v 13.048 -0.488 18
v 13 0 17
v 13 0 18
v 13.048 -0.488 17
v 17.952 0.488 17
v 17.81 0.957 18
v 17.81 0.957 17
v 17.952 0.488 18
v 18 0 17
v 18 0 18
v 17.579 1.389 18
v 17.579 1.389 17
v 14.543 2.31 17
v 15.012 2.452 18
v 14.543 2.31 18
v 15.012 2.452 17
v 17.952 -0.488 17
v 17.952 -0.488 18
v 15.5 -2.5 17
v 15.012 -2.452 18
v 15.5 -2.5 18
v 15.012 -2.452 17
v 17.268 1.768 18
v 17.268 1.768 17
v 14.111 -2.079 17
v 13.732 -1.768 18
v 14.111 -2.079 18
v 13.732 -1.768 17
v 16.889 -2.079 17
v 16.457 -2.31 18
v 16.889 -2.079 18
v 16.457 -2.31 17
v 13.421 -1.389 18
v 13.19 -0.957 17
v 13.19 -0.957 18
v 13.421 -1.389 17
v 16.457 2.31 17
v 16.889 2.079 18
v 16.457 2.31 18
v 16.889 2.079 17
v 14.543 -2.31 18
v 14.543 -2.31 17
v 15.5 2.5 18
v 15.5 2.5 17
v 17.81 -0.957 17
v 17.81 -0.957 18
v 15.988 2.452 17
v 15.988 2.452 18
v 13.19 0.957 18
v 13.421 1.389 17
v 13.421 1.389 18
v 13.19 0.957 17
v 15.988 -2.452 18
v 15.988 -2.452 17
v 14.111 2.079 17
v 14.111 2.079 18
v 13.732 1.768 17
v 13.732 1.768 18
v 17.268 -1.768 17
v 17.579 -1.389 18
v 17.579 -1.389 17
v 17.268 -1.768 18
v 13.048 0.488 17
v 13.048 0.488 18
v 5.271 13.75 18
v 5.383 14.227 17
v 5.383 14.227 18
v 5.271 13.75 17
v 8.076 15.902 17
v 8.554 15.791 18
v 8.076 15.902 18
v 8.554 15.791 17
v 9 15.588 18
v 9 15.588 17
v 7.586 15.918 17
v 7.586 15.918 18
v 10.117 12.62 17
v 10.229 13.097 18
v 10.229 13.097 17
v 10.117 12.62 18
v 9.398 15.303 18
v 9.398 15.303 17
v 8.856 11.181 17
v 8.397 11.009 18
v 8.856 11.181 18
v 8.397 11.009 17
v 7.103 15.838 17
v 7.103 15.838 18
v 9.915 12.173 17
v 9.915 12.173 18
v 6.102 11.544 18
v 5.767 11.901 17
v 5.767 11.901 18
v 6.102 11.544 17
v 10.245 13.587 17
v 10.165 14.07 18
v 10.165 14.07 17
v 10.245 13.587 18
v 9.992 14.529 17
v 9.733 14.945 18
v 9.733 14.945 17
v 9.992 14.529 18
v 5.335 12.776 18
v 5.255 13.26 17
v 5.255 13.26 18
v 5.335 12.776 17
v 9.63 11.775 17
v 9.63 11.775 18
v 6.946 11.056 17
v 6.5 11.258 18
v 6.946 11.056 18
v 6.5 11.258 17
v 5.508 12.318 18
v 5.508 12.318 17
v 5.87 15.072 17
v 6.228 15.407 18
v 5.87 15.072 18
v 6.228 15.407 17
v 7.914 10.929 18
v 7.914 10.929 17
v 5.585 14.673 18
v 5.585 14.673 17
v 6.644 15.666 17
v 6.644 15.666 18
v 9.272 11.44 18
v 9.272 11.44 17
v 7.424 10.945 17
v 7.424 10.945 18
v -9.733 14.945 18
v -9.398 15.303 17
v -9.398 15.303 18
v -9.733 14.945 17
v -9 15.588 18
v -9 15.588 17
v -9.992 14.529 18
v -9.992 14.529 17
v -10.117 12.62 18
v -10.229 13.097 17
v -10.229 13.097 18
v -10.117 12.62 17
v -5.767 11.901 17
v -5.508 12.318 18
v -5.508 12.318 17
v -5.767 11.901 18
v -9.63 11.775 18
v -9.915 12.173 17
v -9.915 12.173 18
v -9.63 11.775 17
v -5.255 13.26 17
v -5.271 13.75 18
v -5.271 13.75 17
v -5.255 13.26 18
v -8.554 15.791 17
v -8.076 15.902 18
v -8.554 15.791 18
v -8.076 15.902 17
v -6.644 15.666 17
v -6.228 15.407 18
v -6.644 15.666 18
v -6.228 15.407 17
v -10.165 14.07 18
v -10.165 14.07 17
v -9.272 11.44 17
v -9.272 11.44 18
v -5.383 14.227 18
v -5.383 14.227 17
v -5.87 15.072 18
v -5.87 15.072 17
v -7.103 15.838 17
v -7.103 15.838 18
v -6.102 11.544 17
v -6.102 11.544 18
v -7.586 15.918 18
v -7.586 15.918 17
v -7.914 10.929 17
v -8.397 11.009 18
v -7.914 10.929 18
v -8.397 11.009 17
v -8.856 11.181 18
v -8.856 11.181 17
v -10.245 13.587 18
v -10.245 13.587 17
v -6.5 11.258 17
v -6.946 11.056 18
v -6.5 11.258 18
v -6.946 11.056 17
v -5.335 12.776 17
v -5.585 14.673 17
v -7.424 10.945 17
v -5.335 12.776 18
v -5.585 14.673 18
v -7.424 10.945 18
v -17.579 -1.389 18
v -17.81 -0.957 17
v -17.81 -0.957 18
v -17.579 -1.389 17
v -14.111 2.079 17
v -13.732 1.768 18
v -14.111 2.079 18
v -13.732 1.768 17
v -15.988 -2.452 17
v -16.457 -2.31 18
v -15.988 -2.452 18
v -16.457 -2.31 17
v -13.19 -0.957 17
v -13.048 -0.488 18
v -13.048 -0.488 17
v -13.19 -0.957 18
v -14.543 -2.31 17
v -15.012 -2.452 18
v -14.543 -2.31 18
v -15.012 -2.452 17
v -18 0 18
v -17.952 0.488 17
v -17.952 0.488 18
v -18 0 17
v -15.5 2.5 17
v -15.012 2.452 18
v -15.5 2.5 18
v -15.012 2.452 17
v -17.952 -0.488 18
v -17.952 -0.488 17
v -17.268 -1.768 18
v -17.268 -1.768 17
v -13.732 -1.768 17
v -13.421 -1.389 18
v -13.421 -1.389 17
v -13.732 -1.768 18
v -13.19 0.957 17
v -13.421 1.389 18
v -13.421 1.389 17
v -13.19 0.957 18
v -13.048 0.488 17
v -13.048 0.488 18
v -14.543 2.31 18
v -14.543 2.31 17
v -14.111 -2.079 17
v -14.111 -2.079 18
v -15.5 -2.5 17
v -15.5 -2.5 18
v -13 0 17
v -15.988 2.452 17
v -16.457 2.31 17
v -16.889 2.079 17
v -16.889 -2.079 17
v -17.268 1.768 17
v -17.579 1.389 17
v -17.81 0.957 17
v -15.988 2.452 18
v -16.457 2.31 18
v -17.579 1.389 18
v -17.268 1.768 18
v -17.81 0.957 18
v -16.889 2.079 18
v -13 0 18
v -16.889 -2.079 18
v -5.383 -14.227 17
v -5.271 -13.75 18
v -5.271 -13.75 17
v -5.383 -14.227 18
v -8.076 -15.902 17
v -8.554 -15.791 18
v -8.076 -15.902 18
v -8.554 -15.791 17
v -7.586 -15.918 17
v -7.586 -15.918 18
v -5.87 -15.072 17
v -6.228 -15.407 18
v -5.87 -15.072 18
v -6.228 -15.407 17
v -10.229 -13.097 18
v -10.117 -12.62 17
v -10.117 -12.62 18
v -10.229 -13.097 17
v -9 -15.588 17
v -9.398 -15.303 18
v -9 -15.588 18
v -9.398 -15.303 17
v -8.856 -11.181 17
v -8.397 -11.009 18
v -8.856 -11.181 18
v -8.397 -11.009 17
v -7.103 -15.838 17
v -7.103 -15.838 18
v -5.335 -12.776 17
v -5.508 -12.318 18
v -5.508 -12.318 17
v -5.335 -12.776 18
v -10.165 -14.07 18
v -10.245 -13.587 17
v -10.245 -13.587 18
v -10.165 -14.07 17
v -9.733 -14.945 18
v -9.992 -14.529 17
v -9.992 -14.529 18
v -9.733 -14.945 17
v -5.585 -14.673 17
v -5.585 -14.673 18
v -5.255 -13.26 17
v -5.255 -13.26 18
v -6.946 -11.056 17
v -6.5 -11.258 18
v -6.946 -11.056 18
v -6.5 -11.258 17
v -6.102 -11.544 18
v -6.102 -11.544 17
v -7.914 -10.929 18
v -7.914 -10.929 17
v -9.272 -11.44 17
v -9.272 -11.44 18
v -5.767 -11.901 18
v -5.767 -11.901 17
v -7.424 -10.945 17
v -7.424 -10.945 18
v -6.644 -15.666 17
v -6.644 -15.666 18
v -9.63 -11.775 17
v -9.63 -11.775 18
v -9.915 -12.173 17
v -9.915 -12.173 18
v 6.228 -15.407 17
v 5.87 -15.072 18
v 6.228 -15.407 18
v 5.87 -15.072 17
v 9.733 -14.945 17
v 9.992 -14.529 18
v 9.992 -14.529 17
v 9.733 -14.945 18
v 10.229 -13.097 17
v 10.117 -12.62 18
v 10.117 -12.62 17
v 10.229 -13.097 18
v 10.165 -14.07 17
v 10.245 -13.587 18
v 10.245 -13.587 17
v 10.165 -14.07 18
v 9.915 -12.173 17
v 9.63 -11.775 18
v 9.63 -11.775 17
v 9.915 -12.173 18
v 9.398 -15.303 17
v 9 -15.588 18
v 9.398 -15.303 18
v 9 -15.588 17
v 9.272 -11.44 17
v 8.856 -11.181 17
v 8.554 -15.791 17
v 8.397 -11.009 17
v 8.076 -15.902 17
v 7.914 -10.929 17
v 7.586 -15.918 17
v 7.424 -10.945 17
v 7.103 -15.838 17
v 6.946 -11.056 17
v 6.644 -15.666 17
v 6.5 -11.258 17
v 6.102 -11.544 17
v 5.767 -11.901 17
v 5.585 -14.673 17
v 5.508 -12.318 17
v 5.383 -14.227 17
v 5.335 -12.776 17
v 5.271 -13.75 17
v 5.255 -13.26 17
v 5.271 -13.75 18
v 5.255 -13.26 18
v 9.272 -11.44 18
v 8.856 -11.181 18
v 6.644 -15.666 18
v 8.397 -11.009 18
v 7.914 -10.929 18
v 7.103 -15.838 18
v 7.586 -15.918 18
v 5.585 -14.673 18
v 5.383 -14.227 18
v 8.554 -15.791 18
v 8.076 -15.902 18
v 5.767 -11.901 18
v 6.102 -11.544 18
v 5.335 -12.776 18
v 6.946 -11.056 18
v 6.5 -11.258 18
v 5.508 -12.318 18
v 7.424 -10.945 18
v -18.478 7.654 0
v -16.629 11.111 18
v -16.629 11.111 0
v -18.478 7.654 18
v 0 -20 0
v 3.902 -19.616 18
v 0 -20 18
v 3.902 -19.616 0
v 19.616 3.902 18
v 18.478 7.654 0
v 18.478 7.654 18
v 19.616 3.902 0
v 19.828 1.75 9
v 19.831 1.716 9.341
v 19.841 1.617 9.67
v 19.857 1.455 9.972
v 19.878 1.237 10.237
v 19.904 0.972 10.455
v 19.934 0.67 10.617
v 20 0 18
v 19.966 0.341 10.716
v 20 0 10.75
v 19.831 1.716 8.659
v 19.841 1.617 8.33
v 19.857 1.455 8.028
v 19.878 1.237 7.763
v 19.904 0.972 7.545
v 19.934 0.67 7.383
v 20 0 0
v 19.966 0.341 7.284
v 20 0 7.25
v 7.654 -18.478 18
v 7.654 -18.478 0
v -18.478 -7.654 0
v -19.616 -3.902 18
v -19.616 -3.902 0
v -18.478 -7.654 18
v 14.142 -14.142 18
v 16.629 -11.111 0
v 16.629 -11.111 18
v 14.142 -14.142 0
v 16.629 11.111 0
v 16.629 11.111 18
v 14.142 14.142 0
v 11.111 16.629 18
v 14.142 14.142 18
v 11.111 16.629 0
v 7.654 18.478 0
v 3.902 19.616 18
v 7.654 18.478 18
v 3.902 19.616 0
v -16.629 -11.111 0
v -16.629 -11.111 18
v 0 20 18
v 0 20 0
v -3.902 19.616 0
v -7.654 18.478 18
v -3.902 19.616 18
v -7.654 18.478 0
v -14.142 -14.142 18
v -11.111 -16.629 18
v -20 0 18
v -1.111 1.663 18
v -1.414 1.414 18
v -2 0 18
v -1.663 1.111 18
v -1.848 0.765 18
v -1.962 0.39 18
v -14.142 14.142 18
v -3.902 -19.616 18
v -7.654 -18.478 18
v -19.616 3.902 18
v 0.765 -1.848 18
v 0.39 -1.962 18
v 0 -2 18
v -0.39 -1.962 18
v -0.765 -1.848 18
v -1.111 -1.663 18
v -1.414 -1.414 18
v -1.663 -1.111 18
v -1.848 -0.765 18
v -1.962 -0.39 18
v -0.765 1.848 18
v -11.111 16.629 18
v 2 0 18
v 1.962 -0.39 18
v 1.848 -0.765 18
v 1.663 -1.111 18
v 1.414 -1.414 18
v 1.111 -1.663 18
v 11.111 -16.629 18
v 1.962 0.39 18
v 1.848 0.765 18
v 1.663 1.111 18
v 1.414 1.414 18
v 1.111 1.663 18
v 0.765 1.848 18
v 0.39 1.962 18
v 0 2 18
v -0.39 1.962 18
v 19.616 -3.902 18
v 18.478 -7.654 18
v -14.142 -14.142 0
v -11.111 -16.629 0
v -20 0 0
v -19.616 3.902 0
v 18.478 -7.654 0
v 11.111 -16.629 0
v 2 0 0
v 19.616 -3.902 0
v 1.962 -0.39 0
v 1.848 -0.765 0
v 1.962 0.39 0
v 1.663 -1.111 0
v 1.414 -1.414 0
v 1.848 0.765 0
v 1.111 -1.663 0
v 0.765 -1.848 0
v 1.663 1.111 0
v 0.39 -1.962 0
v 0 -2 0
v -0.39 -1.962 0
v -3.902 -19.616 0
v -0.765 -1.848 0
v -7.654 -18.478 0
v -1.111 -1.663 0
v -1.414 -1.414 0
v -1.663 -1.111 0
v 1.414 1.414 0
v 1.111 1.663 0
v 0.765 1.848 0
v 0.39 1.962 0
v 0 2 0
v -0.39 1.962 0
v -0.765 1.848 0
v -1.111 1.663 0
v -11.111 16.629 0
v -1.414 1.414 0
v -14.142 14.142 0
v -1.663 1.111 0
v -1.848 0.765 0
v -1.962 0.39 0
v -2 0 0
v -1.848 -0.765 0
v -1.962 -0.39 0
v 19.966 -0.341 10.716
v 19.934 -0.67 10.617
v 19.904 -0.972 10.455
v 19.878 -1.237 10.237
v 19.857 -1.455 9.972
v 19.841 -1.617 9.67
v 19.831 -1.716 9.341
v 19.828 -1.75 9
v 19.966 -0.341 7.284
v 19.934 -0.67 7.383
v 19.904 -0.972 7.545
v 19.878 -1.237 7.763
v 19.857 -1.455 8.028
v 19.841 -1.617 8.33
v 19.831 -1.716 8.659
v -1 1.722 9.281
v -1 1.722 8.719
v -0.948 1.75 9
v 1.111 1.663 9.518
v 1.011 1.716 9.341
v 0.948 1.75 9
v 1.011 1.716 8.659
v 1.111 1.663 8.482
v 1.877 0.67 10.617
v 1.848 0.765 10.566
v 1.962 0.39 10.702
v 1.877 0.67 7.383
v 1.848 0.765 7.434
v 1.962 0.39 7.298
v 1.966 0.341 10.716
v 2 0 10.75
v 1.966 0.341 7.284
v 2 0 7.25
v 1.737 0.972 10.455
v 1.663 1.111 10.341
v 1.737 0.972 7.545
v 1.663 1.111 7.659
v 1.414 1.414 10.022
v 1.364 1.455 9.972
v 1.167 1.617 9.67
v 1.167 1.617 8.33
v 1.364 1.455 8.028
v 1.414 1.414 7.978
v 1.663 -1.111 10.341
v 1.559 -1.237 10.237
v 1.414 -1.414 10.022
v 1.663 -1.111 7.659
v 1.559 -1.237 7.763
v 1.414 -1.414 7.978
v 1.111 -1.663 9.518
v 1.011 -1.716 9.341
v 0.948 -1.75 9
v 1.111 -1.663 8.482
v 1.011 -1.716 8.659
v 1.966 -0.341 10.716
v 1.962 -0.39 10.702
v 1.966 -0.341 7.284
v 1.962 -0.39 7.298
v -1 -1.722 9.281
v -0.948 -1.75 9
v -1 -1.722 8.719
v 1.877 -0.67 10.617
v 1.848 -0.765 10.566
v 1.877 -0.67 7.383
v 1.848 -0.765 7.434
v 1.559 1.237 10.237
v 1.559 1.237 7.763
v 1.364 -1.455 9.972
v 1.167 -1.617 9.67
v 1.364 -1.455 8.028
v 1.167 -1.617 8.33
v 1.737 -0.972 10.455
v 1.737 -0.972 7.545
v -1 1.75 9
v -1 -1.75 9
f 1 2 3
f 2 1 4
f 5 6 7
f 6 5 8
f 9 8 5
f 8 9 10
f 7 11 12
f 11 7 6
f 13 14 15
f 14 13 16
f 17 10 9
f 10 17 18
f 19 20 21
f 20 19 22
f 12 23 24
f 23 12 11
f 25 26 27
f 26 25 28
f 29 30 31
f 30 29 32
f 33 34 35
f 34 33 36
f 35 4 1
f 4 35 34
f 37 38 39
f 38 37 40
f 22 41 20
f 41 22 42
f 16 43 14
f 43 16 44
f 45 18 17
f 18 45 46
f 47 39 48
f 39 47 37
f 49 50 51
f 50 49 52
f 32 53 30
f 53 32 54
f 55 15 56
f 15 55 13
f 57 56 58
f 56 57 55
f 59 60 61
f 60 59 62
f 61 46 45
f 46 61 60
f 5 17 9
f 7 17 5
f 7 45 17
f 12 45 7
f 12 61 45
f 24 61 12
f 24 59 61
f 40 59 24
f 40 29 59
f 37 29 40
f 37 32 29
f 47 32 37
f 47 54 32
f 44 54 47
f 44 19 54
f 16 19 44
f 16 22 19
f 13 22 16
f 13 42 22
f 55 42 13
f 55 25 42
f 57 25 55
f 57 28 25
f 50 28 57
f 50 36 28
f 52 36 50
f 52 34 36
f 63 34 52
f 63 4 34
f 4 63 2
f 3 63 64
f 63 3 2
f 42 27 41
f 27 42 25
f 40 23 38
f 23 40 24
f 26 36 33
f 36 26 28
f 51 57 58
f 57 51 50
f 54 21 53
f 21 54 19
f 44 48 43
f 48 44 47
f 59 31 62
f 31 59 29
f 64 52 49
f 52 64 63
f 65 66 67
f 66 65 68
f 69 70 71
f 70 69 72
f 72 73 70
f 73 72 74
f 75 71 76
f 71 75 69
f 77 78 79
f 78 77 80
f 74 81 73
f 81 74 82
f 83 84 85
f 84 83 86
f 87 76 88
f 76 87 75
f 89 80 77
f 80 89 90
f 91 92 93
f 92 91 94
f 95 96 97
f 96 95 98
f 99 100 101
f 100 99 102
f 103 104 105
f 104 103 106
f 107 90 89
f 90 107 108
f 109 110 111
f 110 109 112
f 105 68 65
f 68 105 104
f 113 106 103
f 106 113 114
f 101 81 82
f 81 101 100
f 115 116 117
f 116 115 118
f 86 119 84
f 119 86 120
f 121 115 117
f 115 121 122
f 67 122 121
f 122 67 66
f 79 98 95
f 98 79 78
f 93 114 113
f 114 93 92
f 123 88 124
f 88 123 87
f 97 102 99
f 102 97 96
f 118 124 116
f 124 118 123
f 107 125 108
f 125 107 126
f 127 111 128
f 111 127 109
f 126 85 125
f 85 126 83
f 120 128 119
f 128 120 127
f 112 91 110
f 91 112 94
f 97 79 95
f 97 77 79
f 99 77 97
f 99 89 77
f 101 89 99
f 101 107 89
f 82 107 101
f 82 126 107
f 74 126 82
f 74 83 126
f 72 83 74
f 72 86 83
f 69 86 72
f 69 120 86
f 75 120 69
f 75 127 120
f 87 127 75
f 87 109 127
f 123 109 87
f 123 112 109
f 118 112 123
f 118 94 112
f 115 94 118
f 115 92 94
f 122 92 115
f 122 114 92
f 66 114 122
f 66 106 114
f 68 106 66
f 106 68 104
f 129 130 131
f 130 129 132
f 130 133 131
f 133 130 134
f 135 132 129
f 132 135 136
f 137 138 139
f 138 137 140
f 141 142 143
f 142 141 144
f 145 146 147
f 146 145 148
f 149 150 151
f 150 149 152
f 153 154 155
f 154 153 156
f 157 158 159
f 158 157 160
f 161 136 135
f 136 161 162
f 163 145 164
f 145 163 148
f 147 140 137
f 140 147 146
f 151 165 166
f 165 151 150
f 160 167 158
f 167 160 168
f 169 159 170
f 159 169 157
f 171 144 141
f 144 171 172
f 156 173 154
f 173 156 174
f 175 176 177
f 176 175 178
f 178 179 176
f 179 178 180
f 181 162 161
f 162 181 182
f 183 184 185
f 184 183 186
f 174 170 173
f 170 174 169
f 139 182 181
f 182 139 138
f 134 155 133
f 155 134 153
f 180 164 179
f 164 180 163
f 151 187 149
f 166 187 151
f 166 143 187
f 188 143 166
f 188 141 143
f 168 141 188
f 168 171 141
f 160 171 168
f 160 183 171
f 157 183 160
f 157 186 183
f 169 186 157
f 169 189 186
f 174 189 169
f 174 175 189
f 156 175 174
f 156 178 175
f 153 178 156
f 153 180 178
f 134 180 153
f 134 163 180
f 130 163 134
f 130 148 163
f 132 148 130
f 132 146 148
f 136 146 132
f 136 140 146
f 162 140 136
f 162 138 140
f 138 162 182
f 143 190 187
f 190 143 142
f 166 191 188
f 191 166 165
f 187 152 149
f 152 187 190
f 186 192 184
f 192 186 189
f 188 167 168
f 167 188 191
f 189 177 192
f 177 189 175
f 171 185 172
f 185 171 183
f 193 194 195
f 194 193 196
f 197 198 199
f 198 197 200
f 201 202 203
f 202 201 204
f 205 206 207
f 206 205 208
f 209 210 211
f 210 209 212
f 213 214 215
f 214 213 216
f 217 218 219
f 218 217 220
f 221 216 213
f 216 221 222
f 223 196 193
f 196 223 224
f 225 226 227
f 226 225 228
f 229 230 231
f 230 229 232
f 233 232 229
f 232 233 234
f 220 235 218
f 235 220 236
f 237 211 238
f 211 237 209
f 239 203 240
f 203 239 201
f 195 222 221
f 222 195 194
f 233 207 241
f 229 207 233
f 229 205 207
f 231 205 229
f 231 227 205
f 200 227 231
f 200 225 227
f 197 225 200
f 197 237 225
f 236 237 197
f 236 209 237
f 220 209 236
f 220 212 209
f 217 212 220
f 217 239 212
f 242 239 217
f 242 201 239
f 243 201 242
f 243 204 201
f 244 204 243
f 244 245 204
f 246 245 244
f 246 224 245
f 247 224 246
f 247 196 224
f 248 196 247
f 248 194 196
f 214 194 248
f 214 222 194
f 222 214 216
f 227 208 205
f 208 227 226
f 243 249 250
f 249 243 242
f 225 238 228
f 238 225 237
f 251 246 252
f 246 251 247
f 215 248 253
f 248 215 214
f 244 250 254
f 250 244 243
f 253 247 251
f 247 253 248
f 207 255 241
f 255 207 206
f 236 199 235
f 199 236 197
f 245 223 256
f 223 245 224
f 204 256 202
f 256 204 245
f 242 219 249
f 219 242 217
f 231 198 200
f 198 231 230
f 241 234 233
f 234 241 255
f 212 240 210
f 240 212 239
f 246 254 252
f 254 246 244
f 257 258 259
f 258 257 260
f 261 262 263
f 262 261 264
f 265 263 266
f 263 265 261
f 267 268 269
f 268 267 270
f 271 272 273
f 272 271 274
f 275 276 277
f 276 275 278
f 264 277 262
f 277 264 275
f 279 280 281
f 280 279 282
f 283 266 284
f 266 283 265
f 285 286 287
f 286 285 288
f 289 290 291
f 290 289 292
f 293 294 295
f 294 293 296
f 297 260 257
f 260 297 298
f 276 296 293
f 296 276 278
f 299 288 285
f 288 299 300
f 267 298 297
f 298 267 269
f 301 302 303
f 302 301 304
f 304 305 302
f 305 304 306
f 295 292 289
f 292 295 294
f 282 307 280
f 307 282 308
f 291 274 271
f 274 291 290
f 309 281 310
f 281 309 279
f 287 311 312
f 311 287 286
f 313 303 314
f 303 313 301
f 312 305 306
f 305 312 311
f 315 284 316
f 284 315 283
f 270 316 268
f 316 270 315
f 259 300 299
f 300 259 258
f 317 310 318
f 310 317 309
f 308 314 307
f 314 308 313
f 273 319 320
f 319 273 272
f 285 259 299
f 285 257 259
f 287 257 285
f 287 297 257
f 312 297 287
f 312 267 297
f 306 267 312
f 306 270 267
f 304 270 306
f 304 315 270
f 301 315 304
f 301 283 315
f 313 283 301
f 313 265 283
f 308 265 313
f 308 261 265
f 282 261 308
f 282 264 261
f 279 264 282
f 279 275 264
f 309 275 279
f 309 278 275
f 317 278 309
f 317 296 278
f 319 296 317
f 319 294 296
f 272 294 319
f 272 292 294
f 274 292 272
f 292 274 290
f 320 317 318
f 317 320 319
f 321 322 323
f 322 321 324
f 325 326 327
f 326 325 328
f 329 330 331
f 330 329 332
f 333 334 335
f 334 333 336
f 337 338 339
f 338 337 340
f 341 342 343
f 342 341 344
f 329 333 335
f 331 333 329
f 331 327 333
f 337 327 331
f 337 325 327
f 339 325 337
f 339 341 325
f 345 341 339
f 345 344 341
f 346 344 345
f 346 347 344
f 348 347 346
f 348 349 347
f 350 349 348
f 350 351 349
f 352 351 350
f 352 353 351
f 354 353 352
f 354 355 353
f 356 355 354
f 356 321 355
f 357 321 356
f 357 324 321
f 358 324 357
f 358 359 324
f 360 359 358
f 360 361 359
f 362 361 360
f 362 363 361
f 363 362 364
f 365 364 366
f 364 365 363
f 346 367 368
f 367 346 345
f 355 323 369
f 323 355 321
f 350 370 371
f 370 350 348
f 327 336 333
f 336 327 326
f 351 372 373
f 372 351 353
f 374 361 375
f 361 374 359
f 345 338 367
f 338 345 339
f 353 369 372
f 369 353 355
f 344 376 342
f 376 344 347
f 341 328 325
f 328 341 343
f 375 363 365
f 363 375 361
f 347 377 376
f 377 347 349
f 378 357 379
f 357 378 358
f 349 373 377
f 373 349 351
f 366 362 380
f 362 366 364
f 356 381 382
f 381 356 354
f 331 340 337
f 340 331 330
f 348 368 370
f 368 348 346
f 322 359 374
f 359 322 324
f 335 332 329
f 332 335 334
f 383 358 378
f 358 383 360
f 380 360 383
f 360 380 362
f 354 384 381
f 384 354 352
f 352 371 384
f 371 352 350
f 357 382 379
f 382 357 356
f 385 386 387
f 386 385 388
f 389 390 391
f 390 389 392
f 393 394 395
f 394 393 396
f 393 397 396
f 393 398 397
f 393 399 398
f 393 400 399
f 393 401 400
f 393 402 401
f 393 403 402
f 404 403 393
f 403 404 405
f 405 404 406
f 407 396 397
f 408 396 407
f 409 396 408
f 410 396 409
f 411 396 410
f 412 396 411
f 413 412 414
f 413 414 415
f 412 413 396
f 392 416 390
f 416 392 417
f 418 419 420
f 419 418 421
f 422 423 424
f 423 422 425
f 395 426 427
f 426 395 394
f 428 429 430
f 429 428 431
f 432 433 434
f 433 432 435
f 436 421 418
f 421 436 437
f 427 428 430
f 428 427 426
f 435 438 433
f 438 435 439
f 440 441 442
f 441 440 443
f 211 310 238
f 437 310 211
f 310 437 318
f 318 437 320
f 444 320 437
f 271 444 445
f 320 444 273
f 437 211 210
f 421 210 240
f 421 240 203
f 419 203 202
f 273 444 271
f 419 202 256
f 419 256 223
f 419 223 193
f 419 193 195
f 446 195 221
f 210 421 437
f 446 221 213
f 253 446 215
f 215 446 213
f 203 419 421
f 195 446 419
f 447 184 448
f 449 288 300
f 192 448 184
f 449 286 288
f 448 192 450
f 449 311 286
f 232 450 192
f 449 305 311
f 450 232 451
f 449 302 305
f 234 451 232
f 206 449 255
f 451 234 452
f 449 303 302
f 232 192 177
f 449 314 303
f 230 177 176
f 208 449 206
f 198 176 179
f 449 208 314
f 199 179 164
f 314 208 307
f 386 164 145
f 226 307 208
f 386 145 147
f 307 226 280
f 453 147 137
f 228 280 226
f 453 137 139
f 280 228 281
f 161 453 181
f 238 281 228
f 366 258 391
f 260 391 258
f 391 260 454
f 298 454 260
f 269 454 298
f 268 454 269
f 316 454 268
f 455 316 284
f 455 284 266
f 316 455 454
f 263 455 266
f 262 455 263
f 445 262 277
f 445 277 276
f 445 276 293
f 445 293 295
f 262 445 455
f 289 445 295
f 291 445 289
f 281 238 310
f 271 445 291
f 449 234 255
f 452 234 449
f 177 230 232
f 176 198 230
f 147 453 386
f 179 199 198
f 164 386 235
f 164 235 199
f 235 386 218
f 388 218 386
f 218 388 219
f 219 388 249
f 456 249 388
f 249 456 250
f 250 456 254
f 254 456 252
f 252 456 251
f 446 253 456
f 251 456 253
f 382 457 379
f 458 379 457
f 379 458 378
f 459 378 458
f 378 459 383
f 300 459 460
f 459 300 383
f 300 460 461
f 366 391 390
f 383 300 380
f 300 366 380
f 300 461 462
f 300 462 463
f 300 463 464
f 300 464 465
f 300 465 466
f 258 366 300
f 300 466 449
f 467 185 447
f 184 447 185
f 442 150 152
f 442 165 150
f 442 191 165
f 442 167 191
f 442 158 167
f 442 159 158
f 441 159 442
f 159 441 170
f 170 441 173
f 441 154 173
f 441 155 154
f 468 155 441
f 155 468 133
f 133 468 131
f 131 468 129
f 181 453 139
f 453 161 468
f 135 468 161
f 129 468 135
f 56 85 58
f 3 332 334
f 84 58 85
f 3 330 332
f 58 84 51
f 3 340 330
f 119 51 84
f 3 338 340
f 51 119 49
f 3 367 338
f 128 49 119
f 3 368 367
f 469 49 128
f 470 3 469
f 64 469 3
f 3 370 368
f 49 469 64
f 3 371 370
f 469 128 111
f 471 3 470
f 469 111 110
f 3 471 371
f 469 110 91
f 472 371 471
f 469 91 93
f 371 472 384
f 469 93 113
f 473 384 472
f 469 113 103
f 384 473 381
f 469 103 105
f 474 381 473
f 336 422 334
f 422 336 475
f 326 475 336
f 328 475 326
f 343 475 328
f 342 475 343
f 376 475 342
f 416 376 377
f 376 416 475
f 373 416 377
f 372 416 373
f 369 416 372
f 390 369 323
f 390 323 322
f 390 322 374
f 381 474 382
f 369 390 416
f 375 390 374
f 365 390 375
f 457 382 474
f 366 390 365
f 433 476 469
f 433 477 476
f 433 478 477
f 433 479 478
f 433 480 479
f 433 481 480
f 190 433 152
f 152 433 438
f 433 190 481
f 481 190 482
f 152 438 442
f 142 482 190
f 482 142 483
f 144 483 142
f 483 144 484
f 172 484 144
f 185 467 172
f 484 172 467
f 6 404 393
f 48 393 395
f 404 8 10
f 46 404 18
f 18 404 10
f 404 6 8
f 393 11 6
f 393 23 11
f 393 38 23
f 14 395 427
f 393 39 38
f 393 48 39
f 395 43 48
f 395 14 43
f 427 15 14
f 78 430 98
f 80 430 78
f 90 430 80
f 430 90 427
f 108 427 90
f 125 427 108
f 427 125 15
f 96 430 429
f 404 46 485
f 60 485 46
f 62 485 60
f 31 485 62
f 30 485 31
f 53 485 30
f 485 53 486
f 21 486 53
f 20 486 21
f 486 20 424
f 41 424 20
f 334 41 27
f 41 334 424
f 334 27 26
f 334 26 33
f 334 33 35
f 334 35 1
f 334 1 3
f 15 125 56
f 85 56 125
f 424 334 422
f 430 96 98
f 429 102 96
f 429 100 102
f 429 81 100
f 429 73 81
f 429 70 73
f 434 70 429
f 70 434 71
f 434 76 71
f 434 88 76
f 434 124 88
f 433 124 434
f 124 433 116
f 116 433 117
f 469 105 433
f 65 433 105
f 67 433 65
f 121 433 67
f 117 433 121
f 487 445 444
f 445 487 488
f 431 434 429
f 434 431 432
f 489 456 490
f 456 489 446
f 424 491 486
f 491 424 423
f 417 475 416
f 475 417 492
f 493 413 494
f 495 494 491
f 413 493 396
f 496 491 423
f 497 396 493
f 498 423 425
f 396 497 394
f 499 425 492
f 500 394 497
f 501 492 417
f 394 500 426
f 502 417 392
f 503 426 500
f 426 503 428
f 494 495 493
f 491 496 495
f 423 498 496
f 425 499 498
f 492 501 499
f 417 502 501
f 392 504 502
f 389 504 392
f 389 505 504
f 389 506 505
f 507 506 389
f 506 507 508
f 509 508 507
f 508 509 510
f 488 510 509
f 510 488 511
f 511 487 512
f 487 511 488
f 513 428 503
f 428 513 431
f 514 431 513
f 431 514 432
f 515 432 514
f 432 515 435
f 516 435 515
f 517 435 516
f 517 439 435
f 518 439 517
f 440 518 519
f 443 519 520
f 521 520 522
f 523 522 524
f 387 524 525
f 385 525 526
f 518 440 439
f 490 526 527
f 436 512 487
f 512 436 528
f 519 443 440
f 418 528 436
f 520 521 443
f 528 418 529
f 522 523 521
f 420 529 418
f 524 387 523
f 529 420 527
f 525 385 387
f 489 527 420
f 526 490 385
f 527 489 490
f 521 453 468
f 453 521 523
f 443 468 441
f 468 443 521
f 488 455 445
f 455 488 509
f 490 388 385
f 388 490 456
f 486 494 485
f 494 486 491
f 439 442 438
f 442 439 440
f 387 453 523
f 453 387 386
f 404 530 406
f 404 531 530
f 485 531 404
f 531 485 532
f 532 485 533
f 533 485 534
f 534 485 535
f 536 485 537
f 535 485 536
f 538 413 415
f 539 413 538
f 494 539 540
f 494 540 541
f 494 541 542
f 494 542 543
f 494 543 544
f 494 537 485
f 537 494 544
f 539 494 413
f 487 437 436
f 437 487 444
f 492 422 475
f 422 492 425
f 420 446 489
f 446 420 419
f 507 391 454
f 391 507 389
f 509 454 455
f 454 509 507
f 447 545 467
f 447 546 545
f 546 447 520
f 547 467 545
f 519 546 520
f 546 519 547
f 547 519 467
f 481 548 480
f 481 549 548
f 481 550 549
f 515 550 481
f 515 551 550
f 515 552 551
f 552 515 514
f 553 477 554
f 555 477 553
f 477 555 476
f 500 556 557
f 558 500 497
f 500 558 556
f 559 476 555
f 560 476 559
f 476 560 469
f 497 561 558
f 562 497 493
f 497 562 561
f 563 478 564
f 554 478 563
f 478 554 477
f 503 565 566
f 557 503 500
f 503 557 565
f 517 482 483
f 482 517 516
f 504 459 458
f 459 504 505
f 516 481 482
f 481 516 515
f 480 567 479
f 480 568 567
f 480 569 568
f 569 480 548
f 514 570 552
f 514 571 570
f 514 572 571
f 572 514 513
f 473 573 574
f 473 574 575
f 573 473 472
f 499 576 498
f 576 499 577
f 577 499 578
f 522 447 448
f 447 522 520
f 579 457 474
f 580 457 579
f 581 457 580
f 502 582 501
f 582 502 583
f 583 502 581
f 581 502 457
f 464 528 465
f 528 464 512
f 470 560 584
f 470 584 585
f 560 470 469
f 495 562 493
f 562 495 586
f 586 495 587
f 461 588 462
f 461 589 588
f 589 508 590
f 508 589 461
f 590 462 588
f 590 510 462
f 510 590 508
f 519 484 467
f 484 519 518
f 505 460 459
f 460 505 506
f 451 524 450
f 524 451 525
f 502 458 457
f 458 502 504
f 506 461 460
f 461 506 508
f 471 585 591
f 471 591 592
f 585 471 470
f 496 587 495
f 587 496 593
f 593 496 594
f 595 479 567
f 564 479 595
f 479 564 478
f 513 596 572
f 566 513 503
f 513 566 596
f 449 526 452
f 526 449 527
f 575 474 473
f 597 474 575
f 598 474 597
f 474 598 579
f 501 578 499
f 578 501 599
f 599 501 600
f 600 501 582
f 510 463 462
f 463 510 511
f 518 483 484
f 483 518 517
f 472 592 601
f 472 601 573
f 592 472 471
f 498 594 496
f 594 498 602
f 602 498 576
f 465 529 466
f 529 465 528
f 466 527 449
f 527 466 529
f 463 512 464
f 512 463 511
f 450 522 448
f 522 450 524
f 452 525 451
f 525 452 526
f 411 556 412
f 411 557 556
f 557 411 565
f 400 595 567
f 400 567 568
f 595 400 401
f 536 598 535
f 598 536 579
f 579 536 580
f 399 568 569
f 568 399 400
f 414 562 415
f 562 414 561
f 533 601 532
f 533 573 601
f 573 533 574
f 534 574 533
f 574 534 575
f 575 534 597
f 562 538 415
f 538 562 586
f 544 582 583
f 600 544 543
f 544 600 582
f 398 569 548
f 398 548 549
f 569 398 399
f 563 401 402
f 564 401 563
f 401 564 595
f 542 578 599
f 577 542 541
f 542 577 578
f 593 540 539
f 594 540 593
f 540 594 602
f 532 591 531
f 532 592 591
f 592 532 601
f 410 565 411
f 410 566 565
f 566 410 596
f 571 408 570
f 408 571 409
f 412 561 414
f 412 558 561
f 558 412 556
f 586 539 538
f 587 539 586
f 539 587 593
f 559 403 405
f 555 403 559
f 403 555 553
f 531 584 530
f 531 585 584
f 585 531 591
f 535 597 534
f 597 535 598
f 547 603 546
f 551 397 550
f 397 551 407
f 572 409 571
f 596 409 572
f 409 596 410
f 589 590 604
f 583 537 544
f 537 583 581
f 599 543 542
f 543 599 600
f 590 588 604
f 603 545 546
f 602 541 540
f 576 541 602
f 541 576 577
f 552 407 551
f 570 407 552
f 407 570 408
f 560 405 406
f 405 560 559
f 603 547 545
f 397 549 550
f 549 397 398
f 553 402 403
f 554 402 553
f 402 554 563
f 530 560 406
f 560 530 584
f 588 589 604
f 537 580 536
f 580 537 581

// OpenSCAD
$fn = 32;

// ----------------------------------------------------------------------
// Control knob: dimpled knob
// ----------------------------------------------------------------------

// --- parameters (mm) ---
dimp_d = 5;               // finger dimple diameter
n_dimp = 6;               // number of dimples
dimp_r = 15.5;            // dimple ring radius
knob_d = 40;              // knob body diameter
knob_h = 18;              // knob body height
bore_d = 4;               // shaft bore diameter
set_d = 3.5;              // set screw bore diameter

dimp_step = 360 / n_dimp;  // dimple angular step

difference() {
  cylinder(h = knob_h, d = knob_d);
  translate([0, 0, -1]) cylinder(h = knob_h + 2, d = bore_d);
  translate([-1, 0, knob_h / 2]) rotate([0, 90, 0])
    cylinder(h = knob_d / 2 + bore_d / 2 + 2, d = set_d);  for (i = [0 : n_dimp - 1])
    rotate([0, 0, i * dimp_step])
      translate([dimp_r, 0, knob_h - 1])
        cylinder(h = 2, d = dimp_d);
}
